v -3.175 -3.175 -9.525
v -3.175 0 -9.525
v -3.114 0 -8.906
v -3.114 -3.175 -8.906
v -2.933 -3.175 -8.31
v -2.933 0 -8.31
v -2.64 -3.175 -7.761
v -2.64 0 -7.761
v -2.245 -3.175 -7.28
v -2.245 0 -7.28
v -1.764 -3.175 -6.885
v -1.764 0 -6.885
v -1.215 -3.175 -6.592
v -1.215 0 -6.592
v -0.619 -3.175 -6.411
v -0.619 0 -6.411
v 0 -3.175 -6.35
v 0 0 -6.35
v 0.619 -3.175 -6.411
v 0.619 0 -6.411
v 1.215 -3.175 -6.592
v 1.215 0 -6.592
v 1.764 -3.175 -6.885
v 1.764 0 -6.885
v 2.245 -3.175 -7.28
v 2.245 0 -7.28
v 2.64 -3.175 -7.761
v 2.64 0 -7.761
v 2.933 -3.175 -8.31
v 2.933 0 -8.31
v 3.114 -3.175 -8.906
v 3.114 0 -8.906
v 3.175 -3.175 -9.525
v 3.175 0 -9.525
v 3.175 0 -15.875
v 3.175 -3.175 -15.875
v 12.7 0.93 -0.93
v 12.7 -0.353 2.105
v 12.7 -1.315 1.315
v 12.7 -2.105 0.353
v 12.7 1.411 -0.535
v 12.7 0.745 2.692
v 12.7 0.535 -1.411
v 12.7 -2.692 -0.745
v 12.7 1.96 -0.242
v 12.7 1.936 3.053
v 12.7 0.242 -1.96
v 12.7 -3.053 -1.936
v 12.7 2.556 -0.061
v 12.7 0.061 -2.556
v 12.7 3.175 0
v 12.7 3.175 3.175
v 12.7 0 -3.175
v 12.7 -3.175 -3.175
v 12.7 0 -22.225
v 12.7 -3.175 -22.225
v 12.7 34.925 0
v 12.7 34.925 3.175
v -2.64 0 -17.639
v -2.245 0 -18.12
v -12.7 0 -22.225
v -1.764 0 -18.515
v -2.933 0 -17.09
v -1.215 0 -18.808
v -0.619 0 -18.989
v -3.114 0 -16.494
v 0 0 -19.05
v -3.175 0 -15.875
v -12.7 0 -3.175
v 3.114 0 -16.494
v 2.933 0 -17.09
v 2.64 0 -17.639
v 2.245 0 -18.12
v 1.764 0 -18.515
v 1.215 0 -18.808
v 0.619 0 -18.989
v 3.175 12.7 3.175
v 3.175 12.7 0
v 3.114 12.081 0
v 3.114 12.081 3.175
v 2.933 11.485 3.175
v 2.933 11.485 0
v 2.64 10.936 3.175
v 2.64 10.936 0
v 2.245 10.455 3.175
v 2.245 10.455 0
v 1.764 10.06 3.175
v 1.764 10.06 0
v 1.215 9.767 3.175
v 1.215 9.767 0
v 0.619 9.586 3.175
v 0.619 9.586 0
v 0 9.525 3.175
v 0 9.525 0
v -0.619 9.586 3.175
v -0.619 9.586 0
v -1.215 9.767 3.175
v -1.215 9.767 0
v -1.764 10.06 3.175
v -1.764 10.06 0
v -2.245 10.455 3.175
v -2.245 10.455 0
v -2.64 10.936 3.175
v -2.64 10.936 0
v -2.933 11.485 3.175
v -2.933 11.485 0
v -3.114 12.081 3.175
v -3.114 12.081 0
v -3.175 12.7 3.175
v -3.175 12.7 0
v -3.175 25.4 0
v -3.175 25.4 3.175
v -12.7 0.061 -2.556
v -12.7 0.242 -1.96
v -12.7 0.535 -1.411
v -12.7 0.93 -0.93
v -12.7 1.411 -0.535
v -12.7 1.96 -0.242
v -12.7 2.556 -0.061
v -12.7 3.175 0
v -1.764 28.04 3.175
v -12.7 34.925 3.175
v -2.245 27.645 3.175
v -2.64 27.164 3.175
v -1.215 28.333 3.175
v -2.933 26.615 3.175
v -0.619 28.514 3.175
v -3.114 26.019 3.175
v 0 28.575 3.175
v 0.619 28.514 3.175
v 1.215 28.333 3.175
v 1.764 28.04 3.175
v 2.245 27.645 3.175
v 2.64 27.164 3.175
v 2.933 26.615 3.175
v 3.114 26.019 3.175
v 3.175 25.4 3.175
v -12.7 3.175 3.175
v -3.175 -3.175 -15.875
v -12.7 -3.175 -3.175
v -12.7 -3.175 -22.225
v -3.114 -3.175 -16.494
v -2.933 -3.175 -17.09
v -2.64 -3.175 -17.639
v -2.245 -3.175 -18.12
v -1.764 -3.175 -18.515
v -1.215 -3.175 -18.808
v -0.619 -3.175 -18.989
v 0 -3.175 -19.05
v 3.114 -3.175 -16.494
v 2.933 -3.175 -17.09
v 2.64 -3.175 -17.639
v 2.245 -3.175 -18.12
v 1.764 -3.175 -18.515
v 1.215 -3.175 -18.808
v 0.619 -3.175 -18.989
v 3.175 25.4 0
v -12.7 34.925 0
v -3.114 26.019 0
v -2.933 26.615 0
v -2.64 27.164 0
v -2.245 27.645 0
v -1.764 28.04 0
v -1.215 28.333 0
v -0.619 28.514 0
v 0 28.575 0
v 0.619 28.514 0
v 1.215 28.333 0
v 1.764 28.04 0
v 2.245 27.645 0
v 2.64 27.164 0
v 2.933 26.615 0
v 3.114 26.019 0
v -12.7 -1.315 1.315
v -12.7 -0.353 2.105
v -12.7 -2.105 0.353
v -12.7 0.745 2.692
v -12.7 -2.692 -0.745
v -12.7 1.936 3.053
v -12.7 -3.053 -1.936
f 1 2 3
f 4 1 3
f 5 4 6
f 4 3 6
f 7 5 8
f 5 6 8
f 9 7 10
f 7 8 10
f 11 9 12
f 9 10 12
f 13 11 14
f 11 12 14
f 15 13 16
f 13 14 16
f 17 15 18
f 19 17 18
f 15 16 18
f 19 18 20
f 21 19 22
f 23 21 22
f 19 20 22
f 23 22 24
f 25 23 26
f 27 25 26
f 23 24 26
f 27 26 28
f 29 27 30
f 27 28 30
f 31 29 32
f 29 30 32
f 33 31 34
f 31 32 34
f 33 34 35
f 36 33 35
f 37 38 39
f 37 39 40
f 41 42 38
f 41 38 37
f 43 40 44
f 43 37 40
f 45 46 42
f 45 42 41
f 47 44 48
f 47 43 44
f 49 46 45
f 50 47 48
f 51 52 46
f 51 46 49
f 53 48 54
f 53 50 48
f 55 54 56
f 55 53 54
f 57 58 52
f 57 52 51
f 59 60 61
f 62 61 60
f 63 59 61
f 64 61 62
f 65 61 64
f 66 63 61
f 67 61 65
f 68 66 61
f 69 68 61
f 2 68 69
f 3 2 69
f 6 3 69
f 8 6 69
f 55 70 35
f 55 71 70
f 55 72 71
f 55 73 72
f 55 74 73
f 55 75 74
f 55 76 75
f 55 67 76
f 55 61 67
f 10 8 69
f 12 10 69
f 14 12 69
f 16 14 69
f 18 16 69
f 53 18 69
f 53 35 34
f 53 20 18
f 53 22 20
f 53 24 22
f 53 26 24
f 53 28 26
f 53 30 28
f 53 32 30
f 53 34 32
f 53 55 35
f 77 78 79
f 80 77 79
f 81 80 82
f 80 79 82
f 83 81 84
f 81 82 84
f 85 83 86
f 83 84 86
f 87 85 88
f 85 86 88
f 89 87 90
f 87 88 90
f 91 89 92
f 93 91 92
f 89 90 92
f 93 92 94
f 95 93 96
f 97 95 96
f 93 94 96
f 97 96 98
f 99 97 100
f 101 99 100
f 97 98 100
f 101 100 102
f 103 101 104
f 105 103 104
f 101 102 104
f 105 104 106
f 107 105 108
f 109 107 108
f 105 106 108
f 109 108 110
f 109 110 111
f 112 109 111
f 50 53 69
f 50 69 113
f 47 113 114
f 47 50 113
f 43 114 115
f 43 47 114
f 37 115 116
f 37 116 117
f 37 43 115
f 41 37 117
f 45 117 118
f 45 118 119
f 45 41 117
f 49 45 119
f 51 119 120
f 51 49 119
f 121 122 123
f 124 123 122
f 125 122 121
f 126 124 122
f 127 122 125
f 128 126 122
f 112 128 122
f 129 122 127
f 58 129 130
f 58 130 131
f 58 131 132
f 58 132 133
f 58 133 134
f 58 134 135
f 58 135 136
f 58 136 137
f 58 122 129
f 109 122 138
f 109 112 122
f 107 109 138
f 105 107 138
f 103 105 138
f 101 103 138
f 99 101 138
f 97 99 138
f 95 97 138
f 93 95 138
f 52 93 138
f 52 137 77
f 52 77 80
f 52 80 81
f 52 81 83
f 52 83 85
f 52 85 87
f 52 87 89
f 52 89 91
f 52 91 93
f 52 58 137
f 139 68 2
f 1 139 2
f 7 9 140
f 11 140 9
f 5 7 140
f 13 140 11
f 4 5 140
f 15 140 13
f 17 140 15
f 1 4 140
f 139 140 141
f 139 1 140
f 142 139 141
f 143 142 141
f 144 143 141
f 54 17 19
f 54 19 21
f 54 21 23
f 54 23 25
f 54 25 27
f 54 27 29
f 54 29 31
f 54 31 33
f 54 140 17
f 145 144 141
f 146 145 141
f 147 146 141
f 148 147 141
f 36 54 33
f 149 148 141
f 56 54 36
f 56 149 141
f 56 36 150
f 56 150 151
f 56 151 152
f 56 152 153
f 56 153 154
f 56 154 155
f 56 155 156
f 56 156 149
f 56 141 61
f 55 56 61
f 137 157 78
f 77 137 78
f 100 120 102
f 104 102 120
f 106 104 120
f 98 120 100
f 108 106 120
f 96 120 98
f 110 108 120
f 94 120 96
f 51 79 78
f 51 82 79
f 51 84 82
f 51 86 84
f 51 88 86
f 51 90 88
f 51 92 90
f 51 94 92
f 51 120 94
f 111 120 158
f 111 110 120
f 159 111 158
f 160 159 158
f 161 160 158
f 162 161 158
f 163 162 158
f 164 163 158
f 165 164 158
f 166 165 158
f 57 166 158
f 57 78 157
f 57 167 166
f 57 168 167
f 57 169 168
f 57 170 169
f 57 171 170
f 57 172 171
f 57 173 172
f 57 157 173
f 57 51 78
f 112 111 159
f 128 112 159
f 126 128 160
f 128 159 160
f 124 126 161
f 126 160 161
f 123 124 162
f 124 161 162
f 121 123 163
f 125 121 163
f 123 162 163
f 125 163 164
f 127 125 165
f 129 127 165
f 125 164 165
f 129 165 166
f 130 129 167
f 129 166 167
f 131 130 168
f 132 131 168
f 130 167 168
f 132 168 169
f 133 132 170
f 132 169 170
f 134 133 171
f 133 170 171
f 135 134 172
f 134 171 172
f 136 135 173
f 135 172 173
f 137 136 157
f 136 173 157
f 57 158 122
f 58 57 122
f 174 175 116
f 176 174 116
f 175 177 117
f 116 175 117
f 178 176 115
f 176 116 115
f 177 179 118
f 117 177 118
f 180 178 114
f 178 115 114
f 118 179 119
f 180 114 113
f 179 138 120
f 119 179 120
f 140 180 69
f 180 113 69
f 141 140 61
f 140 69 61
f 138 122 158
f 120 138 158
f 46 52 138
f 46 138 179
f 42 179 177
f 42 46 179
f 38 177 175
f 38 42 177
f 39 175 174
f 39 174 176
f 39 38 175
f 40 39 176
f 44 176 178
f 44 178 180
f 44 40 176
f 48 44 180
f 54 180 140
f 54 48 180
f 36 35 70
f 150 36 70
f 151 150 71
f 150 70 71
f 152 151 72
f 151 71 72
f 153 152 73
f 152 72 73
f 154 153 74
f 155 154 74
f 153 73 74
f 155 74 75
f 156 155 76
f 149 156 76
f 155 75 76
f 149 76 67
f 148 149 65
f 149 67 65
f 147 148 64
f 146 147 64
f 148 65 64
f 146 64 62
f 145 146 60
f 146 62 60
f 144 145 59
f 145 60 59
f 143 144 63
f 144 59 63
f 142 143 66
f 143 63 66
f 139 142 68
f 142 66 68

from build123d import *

# Parameters (mm, degrees)
EXTRUDE_THIN1_DEPTH = 12.7
CUT_EXTRUDE1_DEPTH  = 44.301226888
CUT_EXTRUDE2_DEPTH  = 44.301226888


with BuildPart() as part:
    # Sketch4 → Extrude-Thin1 (new, symmetric)
    with BuildSketch(Plane(origin=(0, 0, 0), x_dir=(0, 0, -1), z_dir=(1, 0, 0))):
        with BuildLine():
            Line((-3.175, 34.925), (-3.175, 3.175))
            ThreePointArc((-3.175, 3.175), (-1.315128061, -1.315128061), (3.175, -3.175))
            Line((3.175, -3.175), (22.225, -3.175))
            Line((22.225, -3.175), (22.225, 0))
            Line((22.225, 0), (3.175, 0))
            ThreePointArc((3.175, 0), (0.92993597, 0.92993597), (0, 3.175))
            Line((0, 3.175), (0, 34.925))
            Line((0, 34.925), (-3.175, 34.925))
        make_face()
    extrude(amount=EXTRUDE_THIN1_DEPTH, both=True)

    # Sketch5 → Cut-Extrude1 (cut, through all)
    with BuildSketch(Plane.XY):
        with BuildLine():
            Line((3.175, 25.4), (3.175, 12.7))
            ThreePointArc((3.175, 12.7), (0, 9.525), (-3.175, 12.7))
            Line((-3.175, 12.7), (-3.175, 25.4))
            ThreePointArc((-3.175, 25.4), (0, 28.575), (3.175, 25.4))
        make_face()
    extrude(amount=CUT_EXTRUDE1_DEPTH, mode=Mode.SUBTRACT)

    # Sketch6 → Cut-Extrude2 (cut, through all)
    with BuildSketch(Plane(origin=(0, 0, 0), x_dir=(1, 0, 0), z_dir=(0, 1, 0))):
        with BuildLine():
            Line((-3.175, 15.875), (-3.175, 9.525))
            ThreePointArc((-3.175, 9.525), (0, 6.35), (3.175, 9.525))
            Line((3.175, 9.525), (3.175, 15.875))
            ThreePointArc((3.175, 15.875), (0, 19.05), (-3.175, 15.875))
        make_face()
    extrude(amount=-CUT_EXTRUDE2_DEPTH, mode=Mode.SUBTRACT)


solid = part.part
